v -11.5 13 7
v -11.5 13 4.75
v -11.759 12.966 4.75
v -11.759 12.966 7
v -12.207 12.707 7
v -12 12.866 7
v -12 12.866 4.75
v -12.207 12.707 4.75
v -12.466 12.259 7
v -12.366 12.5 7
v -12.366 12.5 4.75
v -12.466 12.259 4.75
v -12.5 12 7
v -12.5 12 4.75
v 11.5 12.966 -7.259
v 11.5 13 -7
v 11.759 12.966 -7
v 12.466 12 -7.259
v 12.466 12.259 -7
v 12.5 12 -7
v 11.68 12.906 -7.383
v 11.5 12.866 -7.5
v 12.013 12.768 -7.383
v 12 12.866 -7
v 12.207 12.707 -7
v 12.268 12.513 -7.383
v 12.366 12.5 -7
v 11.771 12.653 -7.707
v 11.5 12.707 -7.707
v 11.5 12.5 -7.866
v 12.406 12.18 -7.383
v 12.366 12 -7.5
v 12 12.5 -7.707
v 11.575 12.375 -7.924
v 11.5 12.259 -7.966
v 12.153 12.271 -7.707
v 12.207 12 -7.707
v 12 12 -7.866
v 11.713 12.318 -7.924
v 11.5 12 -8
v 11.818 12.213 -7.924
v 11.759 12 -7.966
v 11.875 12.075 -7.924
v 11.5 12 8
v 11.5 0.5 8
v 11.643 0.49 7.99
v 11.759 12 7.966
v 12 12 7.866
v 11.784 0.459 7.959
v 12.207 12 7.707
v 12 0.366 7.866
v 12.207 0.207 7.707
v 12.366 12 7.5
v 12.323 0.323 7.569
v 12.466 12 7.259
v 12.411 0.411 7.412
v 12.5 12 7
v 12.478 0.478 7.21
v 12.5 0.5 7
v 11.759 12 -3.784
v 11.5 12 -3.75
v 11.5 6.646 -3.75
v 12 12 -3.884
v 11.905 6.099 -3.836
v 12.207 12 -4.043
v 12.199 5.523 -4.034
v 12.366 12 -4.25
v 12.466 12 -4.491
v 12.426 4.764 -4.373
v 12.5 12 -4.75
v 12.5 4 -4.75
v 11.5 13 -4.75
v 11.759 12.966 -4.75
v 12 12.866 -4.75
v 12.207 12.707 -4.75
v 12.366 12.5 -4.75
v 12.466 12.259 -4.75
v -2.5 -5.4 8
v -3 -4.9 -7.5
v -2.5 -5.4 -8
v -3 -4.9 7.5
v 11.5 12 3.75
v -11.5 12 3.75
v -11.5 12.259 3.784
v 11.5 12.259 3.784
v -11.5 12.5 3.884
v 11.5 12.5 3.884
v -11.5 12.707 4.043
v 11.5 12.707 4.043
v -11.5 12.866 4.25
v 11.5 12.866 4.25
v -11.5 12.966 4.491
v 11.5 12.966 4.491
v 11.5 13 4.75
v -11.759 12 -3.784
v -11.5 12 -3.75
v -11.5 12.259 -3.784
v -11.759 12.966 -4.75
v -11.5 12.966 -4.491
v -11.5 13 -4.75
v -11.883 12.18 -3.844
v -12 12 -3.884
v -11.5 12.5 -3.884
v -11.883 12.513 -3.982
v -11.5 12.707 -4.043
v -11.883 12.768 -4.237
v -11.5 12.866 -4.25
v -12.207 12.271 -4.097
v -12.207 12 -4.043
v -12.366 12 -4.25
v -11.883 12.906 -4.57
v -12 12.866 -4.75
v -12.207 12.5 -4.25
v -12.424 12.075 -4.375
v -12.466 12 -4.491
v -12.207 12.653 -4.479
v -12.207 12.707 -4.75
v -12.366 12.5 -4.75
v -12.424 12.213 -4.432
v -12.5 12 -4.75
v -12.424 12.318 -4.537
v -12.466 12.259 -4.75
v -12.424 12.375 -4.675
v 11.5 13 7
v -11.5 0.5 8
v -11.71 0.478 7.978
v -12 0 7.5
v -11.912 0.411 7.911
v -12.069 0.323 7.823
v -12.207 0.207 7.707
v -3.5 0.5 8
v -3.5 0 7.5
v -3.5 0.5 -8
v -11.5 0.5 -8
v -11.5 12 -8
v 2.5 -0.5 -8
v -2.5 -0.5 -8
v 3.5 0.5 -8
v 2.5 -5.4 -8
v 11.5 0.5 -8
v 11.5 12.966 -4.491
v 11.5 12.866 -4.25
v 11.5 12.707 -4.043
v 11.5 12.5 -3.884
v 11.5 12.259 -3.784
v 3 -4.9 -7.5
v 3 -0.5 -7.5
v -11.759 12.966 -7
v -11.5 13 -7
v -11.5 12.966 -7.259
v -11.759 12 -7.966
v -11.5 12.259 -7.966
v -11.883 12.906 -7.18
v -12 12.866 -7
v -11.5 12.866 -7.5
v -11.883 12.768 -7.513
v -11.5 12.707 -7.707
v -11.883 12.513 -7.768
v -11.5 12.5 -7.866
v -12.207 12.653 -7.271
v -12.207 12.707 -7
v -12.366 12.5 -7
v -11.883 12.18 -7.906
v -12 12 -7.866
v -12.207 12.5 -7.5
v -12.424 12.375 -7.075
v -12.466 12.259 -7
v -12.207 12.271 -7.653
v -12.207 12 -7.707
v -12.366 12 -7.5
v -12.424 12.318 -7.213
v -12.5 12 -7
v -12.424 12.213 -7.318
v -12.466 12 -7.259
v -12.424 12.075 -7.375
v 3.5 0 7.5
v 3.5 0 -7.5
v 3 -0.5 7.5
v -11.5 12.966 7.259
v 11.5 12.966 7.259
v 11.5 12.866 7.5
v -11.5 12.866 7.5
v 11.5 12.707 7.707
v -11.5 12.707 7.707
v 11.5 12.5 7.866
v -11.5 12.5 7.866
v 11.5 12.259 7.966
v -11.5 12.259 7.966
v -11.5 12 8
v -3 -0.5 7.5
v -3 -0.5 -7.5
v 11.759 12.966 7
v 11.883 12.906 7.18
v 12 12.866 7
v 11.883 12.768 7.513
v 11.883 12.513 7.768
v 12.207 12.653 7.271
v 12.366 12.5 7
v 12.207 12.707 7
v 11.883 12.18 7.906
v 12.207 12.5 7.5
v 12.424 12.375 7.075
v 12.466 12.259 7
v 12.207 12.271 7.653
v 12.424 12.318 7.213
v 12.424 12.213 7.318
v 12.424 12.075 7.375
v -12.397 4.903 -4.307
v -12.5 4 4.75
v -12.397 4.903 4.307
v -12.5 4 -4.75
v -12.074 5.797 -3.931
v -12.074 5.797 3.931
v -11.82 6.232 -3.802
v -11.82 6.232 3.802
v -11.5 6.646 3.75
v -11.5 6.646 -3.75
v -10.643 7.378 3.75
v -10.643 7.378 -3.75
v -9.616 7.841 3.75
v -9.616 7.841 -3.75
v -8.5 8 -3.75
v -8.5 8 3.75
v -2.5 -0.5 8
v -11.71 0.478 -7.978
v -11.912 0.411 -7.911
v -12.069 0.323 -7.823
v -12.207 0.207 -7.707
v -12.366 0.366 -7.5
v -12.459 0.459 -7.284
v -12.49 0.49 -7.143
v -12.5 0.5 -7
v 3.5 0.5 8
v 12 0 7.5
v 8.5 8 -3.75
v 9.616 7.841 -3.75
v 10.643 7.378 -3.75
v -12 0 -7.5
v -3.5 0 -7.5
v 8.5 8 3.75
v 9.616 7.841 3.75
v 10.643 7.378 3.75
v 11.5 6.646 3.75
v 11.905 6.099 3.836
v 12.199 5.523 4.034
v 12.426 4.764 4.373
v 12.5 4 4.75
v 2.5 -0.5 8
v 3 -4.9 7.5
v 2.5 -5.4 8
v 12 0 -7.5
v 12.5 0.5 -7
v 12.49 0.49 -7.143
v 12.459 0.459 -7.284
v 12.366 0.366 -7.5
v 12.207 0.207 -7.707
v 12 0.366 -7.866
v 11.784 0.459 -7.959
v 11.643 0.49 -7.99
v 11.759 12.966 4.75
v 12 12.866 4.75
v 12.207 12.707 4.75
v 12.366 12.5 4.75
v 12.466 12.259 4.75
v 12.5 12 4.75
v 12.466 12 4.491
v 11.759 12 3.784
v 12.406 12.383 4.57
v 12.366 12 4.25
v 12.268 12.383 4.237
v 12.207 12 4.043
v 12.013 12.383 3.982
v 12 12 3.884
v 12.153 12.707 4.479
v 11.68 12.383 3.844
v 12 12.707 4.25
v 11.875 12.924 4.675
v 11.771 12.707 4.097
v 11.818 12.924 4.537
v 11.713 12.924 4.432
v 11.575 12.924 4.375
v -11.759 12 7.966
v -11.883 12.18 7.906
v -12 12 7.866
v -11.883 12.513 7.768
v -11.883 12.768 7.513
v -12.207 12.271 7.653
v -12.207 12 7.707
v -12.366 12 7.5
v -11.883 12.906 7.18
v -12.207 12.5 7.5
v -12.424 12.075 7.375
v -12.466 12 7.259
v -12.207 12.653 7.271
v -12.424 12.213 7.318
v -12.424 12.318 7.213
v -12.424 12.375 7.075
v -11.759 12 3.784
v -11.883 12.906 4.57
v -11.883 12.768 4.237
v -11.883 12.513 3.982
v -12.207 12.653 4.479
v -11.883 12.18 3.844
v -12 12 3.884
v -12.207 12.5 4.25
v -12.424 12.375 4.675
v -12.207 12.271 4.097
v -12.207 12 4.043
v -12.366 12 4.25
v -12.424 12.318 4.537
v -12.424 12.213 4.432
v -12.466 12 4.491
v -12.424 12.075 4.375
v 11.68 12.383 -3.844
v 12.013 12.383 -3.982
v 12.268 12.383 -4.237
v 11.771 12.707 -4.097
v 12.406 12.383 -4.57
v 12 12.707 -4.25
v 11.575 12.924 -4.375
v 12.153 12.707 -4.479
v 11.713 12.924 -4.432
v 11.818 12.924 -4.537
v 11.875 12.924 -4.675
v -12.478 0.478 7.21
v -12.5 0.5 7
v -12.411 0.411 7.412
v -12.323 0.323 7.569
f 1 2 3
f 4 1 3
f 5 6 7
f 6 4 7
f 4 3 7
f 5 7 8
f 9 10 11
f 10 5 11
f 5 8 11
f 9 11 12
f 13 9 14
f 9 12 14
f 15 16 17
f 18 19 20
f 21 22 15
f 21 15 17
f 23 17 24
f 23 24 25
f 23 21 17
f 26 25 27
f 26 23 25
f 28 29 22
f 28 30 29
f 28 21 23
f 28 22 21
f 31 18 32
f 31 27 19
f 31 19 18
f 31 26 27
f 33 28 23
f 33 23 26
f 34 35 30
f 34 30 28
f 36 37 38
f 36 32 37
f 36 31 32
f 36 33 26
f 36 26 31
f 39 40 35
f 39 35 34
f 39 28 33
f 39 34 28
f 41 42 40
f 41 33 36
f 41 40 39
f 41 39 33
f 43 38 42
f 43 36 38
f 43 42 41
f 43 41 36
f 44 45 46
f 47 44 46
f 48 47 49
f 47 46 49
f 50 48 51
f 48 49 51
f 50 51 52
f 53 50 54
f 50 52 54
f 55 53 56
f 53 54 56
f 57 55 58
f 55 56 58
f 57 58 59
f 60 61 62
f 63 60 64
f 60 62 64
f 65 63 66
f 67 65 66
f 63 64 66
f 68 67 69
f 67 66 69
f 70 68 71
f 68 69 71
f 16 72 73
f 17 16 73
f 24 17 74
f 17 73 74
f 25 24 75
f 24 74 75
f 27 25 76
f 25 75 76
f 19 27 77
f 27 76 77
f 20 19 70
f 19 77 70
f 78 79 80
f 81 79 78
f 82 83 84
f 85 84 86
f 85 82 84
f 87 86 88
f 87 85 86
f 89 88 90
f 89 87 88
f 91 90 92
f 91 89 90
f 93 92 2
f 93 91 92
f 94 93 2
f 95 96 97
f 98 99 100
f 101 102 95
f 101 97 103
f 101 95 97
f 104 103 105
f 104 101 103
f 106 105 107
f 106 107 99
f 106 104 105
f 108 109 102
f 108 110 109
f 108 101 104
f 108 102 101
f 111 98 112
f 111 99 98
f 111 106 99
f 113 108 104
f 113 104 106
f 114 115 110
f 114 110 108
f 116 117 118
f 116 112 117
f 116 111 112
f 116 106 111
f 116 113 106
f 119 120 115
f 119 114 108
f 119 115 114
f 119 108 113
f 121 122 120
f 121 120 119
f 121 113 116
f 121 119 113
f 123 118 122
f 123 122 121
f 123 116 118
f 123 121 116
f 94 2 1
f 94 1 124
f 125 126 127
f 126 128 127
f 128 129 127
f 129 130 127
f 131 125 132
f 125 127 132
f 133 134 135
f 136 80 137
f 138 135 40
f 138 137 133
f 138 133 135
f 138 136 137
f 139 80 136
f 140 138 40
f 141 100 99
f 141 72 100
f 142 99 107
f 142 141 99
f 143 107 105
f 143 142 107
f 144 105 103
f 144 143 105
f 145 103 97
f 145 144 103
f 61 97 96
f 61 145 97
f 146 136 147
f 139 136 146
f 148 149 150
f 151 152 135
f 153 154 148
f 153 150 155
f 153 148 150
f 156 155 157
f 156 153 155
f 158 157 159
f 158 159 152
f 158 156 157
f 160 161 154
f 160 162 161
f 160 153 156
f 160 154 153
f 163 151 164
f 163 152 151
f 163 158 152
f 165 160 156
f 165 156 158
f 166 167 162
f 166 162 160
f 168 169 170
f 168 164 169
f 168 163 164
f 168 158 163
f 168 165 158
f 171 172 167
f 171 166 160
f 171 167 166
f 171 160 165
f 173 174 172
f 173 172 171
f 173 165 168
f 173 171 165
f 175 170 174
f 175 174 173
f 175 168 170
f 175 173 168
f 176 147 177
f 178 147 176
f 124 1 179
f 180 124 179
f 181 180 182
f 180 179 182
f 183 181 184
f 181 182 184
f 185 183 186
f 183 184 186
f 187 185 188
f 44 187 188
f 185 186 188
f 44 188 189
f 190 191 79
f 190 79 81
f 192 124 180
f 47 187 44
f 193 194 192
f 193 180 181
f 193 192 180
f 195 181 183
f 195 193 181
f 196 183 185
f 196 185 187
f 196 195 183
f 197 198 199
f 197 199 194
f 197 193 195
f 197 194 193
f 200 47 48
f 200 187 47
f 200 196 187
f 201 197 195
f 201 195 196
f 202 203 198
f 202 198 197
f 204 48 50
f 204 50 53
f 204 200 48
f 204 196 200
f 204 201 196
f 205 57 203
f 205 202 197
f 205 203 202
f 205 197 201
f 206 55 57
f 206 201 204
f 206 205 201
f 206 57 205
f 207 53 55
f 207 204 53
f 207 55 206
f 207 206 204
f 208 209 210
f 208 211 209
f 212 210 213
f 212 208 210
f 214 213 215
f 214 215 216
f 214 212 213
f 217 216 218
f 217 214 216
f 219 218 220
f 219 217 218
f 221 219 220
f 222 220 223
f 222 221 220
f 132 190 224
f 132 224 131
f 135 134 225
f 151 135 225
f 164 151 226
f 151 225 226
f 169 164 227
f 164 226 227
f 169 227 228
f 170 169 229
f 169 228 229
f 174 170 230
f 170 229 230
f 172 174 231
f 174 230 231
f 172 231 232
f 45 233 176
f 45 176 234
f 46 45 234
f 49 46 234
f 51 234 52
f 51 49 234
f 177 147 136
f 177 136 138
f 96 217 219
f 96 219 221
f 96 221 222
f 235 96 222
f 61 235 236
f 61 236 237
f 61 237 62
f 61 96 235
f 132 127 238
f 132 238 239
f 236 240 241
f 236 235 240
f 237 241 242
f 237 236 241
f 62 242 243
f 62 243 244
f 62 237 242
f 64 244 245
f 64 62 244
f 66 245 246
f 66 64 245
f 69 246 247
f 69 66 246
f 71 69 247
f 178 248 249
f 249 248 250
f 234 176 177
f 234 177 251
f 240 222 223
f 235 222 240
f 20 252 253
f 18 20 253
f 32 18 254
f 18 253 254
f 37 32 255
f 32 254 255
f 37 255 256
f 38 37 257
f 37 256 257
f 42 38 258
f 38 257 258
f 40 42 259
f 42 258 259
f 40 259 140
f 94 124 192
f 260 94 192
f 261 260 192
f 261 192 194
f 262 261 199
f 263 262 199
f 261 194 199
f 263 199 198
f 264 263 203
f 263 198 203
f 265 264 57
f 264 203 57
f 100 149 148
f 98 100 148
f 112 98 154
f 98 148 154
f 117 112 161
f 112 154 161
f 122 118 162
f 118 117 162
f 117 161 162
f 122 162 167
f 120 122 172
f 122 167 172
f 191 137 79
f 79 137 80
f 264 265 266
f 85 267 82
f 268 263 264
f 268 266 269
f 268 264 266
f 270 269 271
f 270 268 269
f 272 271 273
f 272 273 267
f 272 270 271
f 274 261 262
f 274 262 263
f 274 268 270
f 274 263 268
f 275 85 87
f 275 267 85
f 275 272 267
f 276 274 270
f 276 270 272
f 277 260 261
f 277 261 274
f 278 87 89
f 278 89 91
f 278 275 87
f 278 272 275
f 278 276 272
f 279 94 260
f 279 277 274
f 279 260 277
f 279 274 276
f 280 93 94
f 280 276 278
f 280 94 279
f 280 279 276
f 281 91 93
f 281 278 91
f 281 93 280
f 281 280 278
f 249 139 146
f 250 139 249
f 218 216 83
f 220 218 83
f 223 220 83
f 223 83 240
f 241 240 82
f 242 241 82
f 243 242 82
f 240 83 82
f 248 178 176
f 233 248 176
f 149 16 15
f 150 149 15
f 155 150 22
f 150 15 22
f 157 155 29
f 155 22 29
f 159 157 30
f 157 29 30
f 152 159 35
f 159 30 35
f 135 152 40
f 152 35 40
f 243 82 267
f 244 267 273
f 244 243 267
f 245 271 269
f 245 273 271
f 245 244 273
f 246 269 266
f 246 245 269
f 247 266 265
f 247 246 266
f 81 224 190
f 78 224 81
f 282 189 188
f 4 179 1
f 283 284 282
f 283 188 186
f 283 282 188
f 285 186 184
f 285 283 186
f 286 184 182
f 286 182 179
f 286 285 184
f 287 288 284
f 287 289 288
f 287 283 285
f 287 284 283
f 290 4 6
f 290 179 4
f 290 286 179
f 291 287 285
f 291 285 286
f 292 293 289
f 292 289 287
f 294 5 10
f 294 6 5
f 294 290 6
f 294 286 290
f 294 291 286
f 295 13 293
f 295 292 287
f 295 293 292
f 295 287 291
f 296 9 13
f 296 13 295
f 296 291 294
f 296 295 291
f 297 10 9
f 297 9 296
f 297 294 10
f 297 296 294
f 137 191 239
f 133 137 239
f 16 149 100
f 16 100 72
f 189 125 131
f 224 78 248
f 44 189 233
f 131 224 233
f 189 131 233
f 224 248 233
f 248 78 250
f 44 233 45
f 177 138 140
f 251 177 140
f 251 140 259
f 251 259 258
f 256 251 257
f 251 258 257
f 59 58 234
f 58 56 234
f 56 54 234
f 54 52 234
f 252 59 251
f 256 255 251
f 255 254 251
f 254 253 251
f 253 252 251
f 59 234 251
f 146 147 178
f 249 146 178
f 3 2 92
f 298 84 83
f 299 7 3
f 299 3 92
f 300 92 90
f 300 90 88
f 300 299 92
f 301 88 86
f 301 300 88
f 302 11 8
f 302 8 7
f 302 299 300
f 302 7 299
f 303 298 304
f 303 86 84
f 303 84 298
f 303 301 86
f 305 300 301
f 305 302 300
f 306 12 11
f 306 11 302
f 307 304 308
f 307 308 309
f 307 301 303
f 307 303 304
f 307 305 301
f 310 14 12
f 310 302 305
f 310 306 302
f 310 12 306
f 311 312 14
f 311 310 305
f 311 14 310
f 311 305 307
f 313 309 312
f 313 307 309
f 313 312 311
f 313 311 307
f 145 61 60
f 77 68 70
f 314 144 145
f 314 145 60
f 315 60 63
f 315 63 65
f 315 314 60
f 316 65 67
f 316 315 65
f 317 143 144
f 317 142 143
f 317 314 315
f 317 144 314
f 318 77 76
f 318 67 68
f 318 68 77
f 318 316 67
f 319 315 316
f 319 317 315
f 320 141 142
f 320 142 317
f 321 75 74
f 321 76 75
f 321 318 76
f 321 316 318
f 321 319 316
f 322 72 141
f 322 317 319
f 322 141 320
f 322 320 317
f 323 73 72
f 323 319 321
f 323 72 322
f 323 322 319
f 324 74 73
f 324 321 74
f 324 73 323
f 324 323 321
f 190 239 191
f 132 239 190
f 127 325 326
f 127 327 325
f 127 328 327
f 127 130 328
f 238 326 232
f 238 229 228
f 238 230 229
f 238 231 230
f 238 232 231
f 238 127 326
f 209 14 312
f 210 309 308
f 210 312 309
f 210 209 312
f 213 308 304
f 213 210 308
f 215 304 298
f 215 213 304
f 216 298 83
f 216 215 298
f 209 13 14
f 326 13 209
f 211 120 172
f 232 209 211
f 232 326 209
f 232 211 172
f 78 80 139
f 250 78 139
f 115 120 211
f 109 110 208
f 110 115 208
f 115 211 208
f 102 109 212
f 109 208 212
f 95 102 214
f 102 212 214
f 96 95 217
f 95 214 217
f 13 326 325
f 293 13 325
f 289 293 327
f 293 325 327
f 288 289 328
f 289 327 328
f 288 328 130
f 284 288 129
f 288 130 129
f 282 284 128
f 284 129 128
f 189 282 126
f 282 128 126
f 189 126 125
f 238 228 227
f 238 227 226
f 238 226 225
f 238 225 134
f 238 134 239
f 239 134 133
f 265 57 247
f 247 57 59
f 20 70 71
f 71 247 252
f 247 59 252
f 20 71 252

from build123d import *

# Parameters (mm, degrees)
SKIZZE1_W                       = 25
SKIZZE1_H                       = 16
AUFSATZ_LINEAR_AUSTRAGEN1_DEPTH = 13
SKIZZE2_W                       = 25
SKIZZE2_H                       = 7.5
SCHNITT_LINEAR_AUSTRAGEN1_DEPTH = 5
SKIZZE3_W                       = 6
SKIZZE3_H                       = 16
AUFSATZ_LINEAR_AUSTRAGEN2_DEPTH = 5.4
VERRUNDUNG1_R                   = 1
FASE1_SIZE                      = 0.5
VERRUNDUNG2_R                   = 4
VERRUNDUNG3_R                   = 1


with BuildPart() as part:
    # Skizze1 → Aufsatz-Linear austragen1 (new body)
    with BuildSketch(Plane(origin=(0, 0, 0), x_dir=(1, 0, 0), z_dir=(0, 1, 0))):
        Rectangle(SKIZZE1_W, SKIZZE1_H)
    extrude(amount=AUFSATZ_LINEAR_AUSTRAGEN1_DEPTH)

    # Skizze2 → Schnitt-Linear austragen1 (cut)
    with BuildSketch(Plane(origin=(0, 13, 0), x_dir=(1, 0, 0), z_dir=(0, 1, 0))):
        Rectangle(SKIZZE2_W, SKIZZE2_H)
    extrude(amount=-SCHNITT_LINEAR_AUSTRAGEN1_DEPTH, mode=Mode.SUBTRACT)

    # Skizze3 → Aufsatz-Linear austragen2 (add)
    with BuildSketch(Plane.XZ):
        Rectangle(SKIZZE3_W, SKIZZE3_H)
    extrude(amount=AUFSATZ_LINEAR_AUSTRAGEN2_DEPTH)

    # Verrundung1
    verrundung1_edges = [part.edges().sort_by_distance(p)[0] for p in [
        (12.5, 10.5, -3.75),
        (12.5, 10.5, 3.75),
        (-12.5, 10.5, 3.75),
        (-12.5, 10.5, -3.75),
        (0, 13, -3.75),
        (0, 13, 3.75),
    ]]
    fillet(verrundung1_edges, radius=VERRUNDUNG1_R)

    # Fase1
    fase1_edges = [part.edges().sort_by_distance(p)[0] for p in [
        (7.75, 0, 8),
        (-7.75, 0, -8),
        (3, 0, 0),
        (3, -2.7, -8),
        (3, -2.7, 8),
        (-3, 0, 0),
        (-3, -2.7, 8),
        (-3, -2.7, -8),
        (3, -5.4, 0),
        (-3, -5.4, 0),
        (-7.75, 0, 8),
        (-12.5, 0, 0),
        (7.75, 0, -8),
        (12.5, 0, 0),
    ]]
    chamfer(fase1_edges, length=FASE1_SIZE)

    # Verrundung2
    verrundung2_edges = [part.edges().sort_by_distance(p)[0] for p in [
        (12.5, 8, 0),
        (-12.5, 8, 0),
    ]]
    fillet(verrundung2_edges, radius=VERRUNDUNG2_R)

    # Verrundung3
    # the kernel refuses this fillet: 1 mm, written as the material it takes off along each edge
    with BuildSketch(Plane(origin=(-11.5, 12, 4.75), x_dir=(0, 1, 0), z_dir=(-1, 0, 0))) as verrundung3_piece_1_section:
        Polygon((0, 0), (VERRUNDUNG3_R, 0), (VERRUNDUNG3_R, VERRUNDUNG3_R), (0, VERRUNDUNG3_R), align=None)
    verrundung3_piece_1 = extrude(amount=VERRUNDUNG3_R, mode=Mode.PRIVATE)
    verrundung3_piece_1 = verrundung3_piece_1 - Plane(origin=(-11.5, 12, 4.75), x_dir=(0, -0.7071067811865475, 0.7071067811865475), z_dir=(-1, 0, 0)) * Sphere(VERRUNDUNG3_R, mode=Mode.PRIVATE)
    add(verrundung3_piece_1, mode=Mode.SUBTRACT)
    with BuildSketch(Plane(origin=(11.5, 12, 4.75), x_dir=(1, 0, 0), z_dir=(0, 1, 0))) as verrundung3_piece_2_section:
        Polygon((0, 0), (VERRUNDUNG3_R, 0), (VERRUNDUNG3_R, VERRUNDUNG3_R), (0, VERRUNDUNG3_R), align=None)
    verrundung3_piece_2 = extrude(amount=VERRUNDUNG3_R, mode=Mode.PRIVATE)
    verrundung3_piece_2 = verrundung3_piece_2 - Plane(origin=(11.5, 12, 4.75), x_dir=(-0.7071067811865475, 0, 0.7071067811865475), z_dir=(0, 1, 0)) * Sphere(VERRUNDUNG3_R, mode=Mode.PRIVATE)
    add(verrundung3_piece_2, mode=Mode.SUBTRACT)
    with BuildSketch(Plane(origin=(-11.5, 12, -4.75), x_dir=(0, 1, 0), z_dir=(-1, 0, 0))) as verrundung3_piece_3_section:
        Polygon((0, 0), (VERRUNDUNG3_R, 0), (VERRUNDUNG3_R, -VERRUNDUNG3_R), (0, -VERRUNDUNG3_R), align=None)
    verrundung3_piece_3 = extrude(amount=VERRUNDUNG3_R, mode=Mode.PRIVATE)
    verrundung3_piece_3 = verrundung3_piece_3 - Plane(origin=(-11.5, 12, -4.75), x_dir=(0, -0.7071067811865475, -0.7071067811865475), z_dir=(-1, 0, 0)) * Sphere(VERRUNDUNG3_R, mode=Mode.PRIVATE)
    add(verrundung3_piece_3, mode=Mode.SUBTRACT)
    with BuildSketch(Plane(origin=(11.5, 12, -4.75), x_dir=(1, 0, 0), z_dir=(0, 1, 0))) as verrundung3_piece_4_section:
        Polygon((0, 0), (VERRUNDUNG3_R, 0), (VERRUNDUNG3_R, -VERRUNDUNG3_R), (0, -VERRUNDUNG3_R), align=None)
    verrundung3_piece_4 = extrude(amount=VERRUNDUNG3_R, mode=Mode.PRIVATE)
    verrundung3_piece_4 = verrundung3_piece_4 - Plane(origin=(11.5, 12, -4.75), x_dir=(-0.7071067811865475, 0, -0.7071067811865475), z_dir=(0, 1, 0)) * Sphere(VERRUNDUNG3_R, mode=Mode.PRIVATE)
    add(verrundung3_piece_4, mode=Mode.SUBTRACT)
    with BuildSketch(Plane(origin=(-11.5, 12, -7), x_dir=(0, 0, -1), z_dir=(-1, 0, 0))) as verrundung3_piece_5_section:
        Polygon((0, 0), (VERRUNDUNG3_R, 0), (VERRUNDUNG3_R, -VERRUNDUNG3_R), (0, -VERRUNDUNG3_R), align=None)
    verrundung3_piece_5 = extrude(amount=VERRUNDUNG3_R, mode=Mode.PRIVATE)
    verrundung3_piece_5 = verrundung3_piece_5 - Plane(origin=(-11.5, 12, -7), x_dir=(0, -0.7071067811865475, 0.7071067811865475), z_dir=(-1, 0, 0)) * Sphere(VERRUNDUNG3_R, mode=Mode.PRIVATE)
    add(verrundung3_piece_5, mode=Mode.SUBTRACT)
    with BuildSketch(Plane(origin=(-11.5, 12, 7), x_dir=(0, 1, 0), z_dir=(-1, 0, 0))) as verrundung3_piece_6_section:
        Polygon((0, 0), (VERRUNDUNG3_R, 0), (VERRUNDUNG3_R, -VERRUNDUNG3_R), (0, -VERRUNDUNG3_R), align=None)
    verrundung3_piece_6 = extrude(amount=VERRUNDUNG3_R, mode=Mode.PRIVATE)
    verrundung3_piece_6 = verrundung3_piece_6 - Plane(origin=(-11.5, 12, 7), x_dir=(0, -0.7071067811865475, -0.7071067811865475), z_dir=(-1, 0, 0)) * Sphere(VERRUNDUNG3_R, mode=Mode.PRIVATE)
    add(verrundung3_piece_6, mode=Mode.SUBTRACT)
    with BuildSketch(Plane(origin=(11.5, 12, 7), x_dir=(0, 1, 0), z_dir=(1, 0, 0))) as verrundung3_piece_7_section:
        Polygon((0, 0), (VERRUNDUNG3_R, 0), (VERRUNDUNG3_R, VERRUNDUNG3_R), (0, VERRUNDUNG3_R), align=None)
    verrundung3_piece_7 = extrude(amount=VERRUNDUNG3_R, mode=Mode.PRIVATE)
    verrundung3_piece_7 = verrundung3_piece_7 - Plane(origin=(11.5, 12, 7), x_dir=(0, -0.7071067811865475, -0.7071067811865475), z_dir=(1, 0, 0)) * Sphere(VERRUNDUNG3_R, mode=Mode.PRIVATE)
    add(verrundung3_piece_7, mode=Mode.SUBTRACT)
    with BuildSketch(Plane(origin=(11.5, 12, -7), x_dir=(1, 0, 0), z_dir=(0, 0, -1))) as verrundung3_piece_8_section:
        Polygon((0, 0), (VERRUNDUNG3_R, 0), (VERRUNDUNG3_R, -VERRUNDUNG3_R), (0, -VERRUNDUNG3_R), align=None)
    verrundung3_piece_8 = extrude(amount=VERRUNDUNG3_R, mode=Mode.PRIVATE)
    verrundung3_piece_8 = verrundung3_piece_8 - Plane(origin=(11.5, 12, -7), x_dir=(-0.7071067811865475, -0.7071067811865475, 0), z_dir=(0, 0, -1)) * Sphere(VERRUNDUNG3_R, mode=Mode.PRIVATE)
    add(verrundung3_piece_8, mode=Mode.SUBTRACT)
    with BuildSketch(Plane(origin=(-12.5, 13, -7), x_dir=(0, -1, 0), z_dir=(0, 0, 1)), Plane(origin=(-12.5, 13, 4.75), x_dir=(0, -1, 0), z_dir=(0, 0, 1))) as verrundung3_piece_9:
        with BuildLine():
            CenterArc((VERRUNDUNG3_R, VERRUNDUNG3_R), VERRUNDUNG3_R, 180, 90)
            Line((0, VERRUNDUNG3_R), (0, 0))
            Line((0, 0), (VERRUNDUNG3_R, 0))
        make_face()
    extrude(amount=2.25, mode=Mode.SUBTRACT)
    with BuildSketch(Plane(origin=(-11.5, 13, 8), x_dir=(0, 0, -1), z_dir=(1, 0, 0)), Plane(origin=(11.5, 13, -8), x_dir=(0, 0, 1), z_dir=(-1, 0, 0))) as verrundung3_piece_10:
        with BuildLine():
            CenterArc((VERRUNDUNG3_R, -VERRUNDUNG3_R), VERRUNDUNG3_R, 90, 90)
            Line((0, -VERRUNDUNG3_R), (0, 0))
            Line((0, 0), (VERRUNDUNG3_R, 0))
        make_face()
    extrude(amount=23, mode=Mode.SUBTRACT)
    with BuildSketch(Plane(origin=(12.5, 13, 7), x_dir=(-1, 0, 0), z_dir=(0, 0, -1)), Plane(origin=(12.5, 13, -4.75), x_dir=(-1, 0, 0), z_dir=(0, 0, -1))) as verrundung3_piece_11:
        with BuildLine():
            CenterArc((VERRUNDUNG3_R, -VERRUNDUNG3_R), VERRUNDUNG3_R, 90, 90)
            Line((0, -VERRUNDUNG3_R), (0, 0))
            Line((0, 0), (VERRUNDUNG3_R, 0))
        make_face()
    extrude(amount=2.25, mode=Mode.SUBTRACT)
    with BuildSketch(Plane(origin=(12.5, -2, 8), x_dir=(-1, 0, 0), z_dir=(0, 1, 0)), Plane(origin=(-12.5, -2, 8), x_dir=(0, 0, -1), z_dir=(0, 1, 0))) as verrundung3_piece_12:
        with BuildLine():
            CenterArc((VERRUNDUNG3_R, -VERRUNDUNG3_R), VERRUNDUNG3_R, 90, 90)
            Line((0, -VERRUNDUNG3_R), (0, 0))
            Line((0, 0), (VERRUNDUNG3_R, 0))
        make_face()
    extrude(amount=14, mode=Mode.SUBTRACT)
    with BuildSketch(Plane(origin=(-12.5, -2, -8), x_dir=(0, 0, 1), z_dir=(0, 1, 0)), Plane(origin=(12.5, -2, -8), x_dir=(-1, 0, 0), z_dir=(0, 1, 0))) as verrundung3_piece_13:
        with BuildLine():
            CenterArc((VERRUNDUNG3_R, VERRUNDUNG3_R), VERRUNDUNG3_R, 180, 90)
            Line((0, VERRUNDUNG3_R), (0, 0))
            Line((0, 0), (VERRUNDUNG3_R, 0))
        make_face()
    extrude(amount=14, mode=Mode.SUBTRACT)


solid = part.part
